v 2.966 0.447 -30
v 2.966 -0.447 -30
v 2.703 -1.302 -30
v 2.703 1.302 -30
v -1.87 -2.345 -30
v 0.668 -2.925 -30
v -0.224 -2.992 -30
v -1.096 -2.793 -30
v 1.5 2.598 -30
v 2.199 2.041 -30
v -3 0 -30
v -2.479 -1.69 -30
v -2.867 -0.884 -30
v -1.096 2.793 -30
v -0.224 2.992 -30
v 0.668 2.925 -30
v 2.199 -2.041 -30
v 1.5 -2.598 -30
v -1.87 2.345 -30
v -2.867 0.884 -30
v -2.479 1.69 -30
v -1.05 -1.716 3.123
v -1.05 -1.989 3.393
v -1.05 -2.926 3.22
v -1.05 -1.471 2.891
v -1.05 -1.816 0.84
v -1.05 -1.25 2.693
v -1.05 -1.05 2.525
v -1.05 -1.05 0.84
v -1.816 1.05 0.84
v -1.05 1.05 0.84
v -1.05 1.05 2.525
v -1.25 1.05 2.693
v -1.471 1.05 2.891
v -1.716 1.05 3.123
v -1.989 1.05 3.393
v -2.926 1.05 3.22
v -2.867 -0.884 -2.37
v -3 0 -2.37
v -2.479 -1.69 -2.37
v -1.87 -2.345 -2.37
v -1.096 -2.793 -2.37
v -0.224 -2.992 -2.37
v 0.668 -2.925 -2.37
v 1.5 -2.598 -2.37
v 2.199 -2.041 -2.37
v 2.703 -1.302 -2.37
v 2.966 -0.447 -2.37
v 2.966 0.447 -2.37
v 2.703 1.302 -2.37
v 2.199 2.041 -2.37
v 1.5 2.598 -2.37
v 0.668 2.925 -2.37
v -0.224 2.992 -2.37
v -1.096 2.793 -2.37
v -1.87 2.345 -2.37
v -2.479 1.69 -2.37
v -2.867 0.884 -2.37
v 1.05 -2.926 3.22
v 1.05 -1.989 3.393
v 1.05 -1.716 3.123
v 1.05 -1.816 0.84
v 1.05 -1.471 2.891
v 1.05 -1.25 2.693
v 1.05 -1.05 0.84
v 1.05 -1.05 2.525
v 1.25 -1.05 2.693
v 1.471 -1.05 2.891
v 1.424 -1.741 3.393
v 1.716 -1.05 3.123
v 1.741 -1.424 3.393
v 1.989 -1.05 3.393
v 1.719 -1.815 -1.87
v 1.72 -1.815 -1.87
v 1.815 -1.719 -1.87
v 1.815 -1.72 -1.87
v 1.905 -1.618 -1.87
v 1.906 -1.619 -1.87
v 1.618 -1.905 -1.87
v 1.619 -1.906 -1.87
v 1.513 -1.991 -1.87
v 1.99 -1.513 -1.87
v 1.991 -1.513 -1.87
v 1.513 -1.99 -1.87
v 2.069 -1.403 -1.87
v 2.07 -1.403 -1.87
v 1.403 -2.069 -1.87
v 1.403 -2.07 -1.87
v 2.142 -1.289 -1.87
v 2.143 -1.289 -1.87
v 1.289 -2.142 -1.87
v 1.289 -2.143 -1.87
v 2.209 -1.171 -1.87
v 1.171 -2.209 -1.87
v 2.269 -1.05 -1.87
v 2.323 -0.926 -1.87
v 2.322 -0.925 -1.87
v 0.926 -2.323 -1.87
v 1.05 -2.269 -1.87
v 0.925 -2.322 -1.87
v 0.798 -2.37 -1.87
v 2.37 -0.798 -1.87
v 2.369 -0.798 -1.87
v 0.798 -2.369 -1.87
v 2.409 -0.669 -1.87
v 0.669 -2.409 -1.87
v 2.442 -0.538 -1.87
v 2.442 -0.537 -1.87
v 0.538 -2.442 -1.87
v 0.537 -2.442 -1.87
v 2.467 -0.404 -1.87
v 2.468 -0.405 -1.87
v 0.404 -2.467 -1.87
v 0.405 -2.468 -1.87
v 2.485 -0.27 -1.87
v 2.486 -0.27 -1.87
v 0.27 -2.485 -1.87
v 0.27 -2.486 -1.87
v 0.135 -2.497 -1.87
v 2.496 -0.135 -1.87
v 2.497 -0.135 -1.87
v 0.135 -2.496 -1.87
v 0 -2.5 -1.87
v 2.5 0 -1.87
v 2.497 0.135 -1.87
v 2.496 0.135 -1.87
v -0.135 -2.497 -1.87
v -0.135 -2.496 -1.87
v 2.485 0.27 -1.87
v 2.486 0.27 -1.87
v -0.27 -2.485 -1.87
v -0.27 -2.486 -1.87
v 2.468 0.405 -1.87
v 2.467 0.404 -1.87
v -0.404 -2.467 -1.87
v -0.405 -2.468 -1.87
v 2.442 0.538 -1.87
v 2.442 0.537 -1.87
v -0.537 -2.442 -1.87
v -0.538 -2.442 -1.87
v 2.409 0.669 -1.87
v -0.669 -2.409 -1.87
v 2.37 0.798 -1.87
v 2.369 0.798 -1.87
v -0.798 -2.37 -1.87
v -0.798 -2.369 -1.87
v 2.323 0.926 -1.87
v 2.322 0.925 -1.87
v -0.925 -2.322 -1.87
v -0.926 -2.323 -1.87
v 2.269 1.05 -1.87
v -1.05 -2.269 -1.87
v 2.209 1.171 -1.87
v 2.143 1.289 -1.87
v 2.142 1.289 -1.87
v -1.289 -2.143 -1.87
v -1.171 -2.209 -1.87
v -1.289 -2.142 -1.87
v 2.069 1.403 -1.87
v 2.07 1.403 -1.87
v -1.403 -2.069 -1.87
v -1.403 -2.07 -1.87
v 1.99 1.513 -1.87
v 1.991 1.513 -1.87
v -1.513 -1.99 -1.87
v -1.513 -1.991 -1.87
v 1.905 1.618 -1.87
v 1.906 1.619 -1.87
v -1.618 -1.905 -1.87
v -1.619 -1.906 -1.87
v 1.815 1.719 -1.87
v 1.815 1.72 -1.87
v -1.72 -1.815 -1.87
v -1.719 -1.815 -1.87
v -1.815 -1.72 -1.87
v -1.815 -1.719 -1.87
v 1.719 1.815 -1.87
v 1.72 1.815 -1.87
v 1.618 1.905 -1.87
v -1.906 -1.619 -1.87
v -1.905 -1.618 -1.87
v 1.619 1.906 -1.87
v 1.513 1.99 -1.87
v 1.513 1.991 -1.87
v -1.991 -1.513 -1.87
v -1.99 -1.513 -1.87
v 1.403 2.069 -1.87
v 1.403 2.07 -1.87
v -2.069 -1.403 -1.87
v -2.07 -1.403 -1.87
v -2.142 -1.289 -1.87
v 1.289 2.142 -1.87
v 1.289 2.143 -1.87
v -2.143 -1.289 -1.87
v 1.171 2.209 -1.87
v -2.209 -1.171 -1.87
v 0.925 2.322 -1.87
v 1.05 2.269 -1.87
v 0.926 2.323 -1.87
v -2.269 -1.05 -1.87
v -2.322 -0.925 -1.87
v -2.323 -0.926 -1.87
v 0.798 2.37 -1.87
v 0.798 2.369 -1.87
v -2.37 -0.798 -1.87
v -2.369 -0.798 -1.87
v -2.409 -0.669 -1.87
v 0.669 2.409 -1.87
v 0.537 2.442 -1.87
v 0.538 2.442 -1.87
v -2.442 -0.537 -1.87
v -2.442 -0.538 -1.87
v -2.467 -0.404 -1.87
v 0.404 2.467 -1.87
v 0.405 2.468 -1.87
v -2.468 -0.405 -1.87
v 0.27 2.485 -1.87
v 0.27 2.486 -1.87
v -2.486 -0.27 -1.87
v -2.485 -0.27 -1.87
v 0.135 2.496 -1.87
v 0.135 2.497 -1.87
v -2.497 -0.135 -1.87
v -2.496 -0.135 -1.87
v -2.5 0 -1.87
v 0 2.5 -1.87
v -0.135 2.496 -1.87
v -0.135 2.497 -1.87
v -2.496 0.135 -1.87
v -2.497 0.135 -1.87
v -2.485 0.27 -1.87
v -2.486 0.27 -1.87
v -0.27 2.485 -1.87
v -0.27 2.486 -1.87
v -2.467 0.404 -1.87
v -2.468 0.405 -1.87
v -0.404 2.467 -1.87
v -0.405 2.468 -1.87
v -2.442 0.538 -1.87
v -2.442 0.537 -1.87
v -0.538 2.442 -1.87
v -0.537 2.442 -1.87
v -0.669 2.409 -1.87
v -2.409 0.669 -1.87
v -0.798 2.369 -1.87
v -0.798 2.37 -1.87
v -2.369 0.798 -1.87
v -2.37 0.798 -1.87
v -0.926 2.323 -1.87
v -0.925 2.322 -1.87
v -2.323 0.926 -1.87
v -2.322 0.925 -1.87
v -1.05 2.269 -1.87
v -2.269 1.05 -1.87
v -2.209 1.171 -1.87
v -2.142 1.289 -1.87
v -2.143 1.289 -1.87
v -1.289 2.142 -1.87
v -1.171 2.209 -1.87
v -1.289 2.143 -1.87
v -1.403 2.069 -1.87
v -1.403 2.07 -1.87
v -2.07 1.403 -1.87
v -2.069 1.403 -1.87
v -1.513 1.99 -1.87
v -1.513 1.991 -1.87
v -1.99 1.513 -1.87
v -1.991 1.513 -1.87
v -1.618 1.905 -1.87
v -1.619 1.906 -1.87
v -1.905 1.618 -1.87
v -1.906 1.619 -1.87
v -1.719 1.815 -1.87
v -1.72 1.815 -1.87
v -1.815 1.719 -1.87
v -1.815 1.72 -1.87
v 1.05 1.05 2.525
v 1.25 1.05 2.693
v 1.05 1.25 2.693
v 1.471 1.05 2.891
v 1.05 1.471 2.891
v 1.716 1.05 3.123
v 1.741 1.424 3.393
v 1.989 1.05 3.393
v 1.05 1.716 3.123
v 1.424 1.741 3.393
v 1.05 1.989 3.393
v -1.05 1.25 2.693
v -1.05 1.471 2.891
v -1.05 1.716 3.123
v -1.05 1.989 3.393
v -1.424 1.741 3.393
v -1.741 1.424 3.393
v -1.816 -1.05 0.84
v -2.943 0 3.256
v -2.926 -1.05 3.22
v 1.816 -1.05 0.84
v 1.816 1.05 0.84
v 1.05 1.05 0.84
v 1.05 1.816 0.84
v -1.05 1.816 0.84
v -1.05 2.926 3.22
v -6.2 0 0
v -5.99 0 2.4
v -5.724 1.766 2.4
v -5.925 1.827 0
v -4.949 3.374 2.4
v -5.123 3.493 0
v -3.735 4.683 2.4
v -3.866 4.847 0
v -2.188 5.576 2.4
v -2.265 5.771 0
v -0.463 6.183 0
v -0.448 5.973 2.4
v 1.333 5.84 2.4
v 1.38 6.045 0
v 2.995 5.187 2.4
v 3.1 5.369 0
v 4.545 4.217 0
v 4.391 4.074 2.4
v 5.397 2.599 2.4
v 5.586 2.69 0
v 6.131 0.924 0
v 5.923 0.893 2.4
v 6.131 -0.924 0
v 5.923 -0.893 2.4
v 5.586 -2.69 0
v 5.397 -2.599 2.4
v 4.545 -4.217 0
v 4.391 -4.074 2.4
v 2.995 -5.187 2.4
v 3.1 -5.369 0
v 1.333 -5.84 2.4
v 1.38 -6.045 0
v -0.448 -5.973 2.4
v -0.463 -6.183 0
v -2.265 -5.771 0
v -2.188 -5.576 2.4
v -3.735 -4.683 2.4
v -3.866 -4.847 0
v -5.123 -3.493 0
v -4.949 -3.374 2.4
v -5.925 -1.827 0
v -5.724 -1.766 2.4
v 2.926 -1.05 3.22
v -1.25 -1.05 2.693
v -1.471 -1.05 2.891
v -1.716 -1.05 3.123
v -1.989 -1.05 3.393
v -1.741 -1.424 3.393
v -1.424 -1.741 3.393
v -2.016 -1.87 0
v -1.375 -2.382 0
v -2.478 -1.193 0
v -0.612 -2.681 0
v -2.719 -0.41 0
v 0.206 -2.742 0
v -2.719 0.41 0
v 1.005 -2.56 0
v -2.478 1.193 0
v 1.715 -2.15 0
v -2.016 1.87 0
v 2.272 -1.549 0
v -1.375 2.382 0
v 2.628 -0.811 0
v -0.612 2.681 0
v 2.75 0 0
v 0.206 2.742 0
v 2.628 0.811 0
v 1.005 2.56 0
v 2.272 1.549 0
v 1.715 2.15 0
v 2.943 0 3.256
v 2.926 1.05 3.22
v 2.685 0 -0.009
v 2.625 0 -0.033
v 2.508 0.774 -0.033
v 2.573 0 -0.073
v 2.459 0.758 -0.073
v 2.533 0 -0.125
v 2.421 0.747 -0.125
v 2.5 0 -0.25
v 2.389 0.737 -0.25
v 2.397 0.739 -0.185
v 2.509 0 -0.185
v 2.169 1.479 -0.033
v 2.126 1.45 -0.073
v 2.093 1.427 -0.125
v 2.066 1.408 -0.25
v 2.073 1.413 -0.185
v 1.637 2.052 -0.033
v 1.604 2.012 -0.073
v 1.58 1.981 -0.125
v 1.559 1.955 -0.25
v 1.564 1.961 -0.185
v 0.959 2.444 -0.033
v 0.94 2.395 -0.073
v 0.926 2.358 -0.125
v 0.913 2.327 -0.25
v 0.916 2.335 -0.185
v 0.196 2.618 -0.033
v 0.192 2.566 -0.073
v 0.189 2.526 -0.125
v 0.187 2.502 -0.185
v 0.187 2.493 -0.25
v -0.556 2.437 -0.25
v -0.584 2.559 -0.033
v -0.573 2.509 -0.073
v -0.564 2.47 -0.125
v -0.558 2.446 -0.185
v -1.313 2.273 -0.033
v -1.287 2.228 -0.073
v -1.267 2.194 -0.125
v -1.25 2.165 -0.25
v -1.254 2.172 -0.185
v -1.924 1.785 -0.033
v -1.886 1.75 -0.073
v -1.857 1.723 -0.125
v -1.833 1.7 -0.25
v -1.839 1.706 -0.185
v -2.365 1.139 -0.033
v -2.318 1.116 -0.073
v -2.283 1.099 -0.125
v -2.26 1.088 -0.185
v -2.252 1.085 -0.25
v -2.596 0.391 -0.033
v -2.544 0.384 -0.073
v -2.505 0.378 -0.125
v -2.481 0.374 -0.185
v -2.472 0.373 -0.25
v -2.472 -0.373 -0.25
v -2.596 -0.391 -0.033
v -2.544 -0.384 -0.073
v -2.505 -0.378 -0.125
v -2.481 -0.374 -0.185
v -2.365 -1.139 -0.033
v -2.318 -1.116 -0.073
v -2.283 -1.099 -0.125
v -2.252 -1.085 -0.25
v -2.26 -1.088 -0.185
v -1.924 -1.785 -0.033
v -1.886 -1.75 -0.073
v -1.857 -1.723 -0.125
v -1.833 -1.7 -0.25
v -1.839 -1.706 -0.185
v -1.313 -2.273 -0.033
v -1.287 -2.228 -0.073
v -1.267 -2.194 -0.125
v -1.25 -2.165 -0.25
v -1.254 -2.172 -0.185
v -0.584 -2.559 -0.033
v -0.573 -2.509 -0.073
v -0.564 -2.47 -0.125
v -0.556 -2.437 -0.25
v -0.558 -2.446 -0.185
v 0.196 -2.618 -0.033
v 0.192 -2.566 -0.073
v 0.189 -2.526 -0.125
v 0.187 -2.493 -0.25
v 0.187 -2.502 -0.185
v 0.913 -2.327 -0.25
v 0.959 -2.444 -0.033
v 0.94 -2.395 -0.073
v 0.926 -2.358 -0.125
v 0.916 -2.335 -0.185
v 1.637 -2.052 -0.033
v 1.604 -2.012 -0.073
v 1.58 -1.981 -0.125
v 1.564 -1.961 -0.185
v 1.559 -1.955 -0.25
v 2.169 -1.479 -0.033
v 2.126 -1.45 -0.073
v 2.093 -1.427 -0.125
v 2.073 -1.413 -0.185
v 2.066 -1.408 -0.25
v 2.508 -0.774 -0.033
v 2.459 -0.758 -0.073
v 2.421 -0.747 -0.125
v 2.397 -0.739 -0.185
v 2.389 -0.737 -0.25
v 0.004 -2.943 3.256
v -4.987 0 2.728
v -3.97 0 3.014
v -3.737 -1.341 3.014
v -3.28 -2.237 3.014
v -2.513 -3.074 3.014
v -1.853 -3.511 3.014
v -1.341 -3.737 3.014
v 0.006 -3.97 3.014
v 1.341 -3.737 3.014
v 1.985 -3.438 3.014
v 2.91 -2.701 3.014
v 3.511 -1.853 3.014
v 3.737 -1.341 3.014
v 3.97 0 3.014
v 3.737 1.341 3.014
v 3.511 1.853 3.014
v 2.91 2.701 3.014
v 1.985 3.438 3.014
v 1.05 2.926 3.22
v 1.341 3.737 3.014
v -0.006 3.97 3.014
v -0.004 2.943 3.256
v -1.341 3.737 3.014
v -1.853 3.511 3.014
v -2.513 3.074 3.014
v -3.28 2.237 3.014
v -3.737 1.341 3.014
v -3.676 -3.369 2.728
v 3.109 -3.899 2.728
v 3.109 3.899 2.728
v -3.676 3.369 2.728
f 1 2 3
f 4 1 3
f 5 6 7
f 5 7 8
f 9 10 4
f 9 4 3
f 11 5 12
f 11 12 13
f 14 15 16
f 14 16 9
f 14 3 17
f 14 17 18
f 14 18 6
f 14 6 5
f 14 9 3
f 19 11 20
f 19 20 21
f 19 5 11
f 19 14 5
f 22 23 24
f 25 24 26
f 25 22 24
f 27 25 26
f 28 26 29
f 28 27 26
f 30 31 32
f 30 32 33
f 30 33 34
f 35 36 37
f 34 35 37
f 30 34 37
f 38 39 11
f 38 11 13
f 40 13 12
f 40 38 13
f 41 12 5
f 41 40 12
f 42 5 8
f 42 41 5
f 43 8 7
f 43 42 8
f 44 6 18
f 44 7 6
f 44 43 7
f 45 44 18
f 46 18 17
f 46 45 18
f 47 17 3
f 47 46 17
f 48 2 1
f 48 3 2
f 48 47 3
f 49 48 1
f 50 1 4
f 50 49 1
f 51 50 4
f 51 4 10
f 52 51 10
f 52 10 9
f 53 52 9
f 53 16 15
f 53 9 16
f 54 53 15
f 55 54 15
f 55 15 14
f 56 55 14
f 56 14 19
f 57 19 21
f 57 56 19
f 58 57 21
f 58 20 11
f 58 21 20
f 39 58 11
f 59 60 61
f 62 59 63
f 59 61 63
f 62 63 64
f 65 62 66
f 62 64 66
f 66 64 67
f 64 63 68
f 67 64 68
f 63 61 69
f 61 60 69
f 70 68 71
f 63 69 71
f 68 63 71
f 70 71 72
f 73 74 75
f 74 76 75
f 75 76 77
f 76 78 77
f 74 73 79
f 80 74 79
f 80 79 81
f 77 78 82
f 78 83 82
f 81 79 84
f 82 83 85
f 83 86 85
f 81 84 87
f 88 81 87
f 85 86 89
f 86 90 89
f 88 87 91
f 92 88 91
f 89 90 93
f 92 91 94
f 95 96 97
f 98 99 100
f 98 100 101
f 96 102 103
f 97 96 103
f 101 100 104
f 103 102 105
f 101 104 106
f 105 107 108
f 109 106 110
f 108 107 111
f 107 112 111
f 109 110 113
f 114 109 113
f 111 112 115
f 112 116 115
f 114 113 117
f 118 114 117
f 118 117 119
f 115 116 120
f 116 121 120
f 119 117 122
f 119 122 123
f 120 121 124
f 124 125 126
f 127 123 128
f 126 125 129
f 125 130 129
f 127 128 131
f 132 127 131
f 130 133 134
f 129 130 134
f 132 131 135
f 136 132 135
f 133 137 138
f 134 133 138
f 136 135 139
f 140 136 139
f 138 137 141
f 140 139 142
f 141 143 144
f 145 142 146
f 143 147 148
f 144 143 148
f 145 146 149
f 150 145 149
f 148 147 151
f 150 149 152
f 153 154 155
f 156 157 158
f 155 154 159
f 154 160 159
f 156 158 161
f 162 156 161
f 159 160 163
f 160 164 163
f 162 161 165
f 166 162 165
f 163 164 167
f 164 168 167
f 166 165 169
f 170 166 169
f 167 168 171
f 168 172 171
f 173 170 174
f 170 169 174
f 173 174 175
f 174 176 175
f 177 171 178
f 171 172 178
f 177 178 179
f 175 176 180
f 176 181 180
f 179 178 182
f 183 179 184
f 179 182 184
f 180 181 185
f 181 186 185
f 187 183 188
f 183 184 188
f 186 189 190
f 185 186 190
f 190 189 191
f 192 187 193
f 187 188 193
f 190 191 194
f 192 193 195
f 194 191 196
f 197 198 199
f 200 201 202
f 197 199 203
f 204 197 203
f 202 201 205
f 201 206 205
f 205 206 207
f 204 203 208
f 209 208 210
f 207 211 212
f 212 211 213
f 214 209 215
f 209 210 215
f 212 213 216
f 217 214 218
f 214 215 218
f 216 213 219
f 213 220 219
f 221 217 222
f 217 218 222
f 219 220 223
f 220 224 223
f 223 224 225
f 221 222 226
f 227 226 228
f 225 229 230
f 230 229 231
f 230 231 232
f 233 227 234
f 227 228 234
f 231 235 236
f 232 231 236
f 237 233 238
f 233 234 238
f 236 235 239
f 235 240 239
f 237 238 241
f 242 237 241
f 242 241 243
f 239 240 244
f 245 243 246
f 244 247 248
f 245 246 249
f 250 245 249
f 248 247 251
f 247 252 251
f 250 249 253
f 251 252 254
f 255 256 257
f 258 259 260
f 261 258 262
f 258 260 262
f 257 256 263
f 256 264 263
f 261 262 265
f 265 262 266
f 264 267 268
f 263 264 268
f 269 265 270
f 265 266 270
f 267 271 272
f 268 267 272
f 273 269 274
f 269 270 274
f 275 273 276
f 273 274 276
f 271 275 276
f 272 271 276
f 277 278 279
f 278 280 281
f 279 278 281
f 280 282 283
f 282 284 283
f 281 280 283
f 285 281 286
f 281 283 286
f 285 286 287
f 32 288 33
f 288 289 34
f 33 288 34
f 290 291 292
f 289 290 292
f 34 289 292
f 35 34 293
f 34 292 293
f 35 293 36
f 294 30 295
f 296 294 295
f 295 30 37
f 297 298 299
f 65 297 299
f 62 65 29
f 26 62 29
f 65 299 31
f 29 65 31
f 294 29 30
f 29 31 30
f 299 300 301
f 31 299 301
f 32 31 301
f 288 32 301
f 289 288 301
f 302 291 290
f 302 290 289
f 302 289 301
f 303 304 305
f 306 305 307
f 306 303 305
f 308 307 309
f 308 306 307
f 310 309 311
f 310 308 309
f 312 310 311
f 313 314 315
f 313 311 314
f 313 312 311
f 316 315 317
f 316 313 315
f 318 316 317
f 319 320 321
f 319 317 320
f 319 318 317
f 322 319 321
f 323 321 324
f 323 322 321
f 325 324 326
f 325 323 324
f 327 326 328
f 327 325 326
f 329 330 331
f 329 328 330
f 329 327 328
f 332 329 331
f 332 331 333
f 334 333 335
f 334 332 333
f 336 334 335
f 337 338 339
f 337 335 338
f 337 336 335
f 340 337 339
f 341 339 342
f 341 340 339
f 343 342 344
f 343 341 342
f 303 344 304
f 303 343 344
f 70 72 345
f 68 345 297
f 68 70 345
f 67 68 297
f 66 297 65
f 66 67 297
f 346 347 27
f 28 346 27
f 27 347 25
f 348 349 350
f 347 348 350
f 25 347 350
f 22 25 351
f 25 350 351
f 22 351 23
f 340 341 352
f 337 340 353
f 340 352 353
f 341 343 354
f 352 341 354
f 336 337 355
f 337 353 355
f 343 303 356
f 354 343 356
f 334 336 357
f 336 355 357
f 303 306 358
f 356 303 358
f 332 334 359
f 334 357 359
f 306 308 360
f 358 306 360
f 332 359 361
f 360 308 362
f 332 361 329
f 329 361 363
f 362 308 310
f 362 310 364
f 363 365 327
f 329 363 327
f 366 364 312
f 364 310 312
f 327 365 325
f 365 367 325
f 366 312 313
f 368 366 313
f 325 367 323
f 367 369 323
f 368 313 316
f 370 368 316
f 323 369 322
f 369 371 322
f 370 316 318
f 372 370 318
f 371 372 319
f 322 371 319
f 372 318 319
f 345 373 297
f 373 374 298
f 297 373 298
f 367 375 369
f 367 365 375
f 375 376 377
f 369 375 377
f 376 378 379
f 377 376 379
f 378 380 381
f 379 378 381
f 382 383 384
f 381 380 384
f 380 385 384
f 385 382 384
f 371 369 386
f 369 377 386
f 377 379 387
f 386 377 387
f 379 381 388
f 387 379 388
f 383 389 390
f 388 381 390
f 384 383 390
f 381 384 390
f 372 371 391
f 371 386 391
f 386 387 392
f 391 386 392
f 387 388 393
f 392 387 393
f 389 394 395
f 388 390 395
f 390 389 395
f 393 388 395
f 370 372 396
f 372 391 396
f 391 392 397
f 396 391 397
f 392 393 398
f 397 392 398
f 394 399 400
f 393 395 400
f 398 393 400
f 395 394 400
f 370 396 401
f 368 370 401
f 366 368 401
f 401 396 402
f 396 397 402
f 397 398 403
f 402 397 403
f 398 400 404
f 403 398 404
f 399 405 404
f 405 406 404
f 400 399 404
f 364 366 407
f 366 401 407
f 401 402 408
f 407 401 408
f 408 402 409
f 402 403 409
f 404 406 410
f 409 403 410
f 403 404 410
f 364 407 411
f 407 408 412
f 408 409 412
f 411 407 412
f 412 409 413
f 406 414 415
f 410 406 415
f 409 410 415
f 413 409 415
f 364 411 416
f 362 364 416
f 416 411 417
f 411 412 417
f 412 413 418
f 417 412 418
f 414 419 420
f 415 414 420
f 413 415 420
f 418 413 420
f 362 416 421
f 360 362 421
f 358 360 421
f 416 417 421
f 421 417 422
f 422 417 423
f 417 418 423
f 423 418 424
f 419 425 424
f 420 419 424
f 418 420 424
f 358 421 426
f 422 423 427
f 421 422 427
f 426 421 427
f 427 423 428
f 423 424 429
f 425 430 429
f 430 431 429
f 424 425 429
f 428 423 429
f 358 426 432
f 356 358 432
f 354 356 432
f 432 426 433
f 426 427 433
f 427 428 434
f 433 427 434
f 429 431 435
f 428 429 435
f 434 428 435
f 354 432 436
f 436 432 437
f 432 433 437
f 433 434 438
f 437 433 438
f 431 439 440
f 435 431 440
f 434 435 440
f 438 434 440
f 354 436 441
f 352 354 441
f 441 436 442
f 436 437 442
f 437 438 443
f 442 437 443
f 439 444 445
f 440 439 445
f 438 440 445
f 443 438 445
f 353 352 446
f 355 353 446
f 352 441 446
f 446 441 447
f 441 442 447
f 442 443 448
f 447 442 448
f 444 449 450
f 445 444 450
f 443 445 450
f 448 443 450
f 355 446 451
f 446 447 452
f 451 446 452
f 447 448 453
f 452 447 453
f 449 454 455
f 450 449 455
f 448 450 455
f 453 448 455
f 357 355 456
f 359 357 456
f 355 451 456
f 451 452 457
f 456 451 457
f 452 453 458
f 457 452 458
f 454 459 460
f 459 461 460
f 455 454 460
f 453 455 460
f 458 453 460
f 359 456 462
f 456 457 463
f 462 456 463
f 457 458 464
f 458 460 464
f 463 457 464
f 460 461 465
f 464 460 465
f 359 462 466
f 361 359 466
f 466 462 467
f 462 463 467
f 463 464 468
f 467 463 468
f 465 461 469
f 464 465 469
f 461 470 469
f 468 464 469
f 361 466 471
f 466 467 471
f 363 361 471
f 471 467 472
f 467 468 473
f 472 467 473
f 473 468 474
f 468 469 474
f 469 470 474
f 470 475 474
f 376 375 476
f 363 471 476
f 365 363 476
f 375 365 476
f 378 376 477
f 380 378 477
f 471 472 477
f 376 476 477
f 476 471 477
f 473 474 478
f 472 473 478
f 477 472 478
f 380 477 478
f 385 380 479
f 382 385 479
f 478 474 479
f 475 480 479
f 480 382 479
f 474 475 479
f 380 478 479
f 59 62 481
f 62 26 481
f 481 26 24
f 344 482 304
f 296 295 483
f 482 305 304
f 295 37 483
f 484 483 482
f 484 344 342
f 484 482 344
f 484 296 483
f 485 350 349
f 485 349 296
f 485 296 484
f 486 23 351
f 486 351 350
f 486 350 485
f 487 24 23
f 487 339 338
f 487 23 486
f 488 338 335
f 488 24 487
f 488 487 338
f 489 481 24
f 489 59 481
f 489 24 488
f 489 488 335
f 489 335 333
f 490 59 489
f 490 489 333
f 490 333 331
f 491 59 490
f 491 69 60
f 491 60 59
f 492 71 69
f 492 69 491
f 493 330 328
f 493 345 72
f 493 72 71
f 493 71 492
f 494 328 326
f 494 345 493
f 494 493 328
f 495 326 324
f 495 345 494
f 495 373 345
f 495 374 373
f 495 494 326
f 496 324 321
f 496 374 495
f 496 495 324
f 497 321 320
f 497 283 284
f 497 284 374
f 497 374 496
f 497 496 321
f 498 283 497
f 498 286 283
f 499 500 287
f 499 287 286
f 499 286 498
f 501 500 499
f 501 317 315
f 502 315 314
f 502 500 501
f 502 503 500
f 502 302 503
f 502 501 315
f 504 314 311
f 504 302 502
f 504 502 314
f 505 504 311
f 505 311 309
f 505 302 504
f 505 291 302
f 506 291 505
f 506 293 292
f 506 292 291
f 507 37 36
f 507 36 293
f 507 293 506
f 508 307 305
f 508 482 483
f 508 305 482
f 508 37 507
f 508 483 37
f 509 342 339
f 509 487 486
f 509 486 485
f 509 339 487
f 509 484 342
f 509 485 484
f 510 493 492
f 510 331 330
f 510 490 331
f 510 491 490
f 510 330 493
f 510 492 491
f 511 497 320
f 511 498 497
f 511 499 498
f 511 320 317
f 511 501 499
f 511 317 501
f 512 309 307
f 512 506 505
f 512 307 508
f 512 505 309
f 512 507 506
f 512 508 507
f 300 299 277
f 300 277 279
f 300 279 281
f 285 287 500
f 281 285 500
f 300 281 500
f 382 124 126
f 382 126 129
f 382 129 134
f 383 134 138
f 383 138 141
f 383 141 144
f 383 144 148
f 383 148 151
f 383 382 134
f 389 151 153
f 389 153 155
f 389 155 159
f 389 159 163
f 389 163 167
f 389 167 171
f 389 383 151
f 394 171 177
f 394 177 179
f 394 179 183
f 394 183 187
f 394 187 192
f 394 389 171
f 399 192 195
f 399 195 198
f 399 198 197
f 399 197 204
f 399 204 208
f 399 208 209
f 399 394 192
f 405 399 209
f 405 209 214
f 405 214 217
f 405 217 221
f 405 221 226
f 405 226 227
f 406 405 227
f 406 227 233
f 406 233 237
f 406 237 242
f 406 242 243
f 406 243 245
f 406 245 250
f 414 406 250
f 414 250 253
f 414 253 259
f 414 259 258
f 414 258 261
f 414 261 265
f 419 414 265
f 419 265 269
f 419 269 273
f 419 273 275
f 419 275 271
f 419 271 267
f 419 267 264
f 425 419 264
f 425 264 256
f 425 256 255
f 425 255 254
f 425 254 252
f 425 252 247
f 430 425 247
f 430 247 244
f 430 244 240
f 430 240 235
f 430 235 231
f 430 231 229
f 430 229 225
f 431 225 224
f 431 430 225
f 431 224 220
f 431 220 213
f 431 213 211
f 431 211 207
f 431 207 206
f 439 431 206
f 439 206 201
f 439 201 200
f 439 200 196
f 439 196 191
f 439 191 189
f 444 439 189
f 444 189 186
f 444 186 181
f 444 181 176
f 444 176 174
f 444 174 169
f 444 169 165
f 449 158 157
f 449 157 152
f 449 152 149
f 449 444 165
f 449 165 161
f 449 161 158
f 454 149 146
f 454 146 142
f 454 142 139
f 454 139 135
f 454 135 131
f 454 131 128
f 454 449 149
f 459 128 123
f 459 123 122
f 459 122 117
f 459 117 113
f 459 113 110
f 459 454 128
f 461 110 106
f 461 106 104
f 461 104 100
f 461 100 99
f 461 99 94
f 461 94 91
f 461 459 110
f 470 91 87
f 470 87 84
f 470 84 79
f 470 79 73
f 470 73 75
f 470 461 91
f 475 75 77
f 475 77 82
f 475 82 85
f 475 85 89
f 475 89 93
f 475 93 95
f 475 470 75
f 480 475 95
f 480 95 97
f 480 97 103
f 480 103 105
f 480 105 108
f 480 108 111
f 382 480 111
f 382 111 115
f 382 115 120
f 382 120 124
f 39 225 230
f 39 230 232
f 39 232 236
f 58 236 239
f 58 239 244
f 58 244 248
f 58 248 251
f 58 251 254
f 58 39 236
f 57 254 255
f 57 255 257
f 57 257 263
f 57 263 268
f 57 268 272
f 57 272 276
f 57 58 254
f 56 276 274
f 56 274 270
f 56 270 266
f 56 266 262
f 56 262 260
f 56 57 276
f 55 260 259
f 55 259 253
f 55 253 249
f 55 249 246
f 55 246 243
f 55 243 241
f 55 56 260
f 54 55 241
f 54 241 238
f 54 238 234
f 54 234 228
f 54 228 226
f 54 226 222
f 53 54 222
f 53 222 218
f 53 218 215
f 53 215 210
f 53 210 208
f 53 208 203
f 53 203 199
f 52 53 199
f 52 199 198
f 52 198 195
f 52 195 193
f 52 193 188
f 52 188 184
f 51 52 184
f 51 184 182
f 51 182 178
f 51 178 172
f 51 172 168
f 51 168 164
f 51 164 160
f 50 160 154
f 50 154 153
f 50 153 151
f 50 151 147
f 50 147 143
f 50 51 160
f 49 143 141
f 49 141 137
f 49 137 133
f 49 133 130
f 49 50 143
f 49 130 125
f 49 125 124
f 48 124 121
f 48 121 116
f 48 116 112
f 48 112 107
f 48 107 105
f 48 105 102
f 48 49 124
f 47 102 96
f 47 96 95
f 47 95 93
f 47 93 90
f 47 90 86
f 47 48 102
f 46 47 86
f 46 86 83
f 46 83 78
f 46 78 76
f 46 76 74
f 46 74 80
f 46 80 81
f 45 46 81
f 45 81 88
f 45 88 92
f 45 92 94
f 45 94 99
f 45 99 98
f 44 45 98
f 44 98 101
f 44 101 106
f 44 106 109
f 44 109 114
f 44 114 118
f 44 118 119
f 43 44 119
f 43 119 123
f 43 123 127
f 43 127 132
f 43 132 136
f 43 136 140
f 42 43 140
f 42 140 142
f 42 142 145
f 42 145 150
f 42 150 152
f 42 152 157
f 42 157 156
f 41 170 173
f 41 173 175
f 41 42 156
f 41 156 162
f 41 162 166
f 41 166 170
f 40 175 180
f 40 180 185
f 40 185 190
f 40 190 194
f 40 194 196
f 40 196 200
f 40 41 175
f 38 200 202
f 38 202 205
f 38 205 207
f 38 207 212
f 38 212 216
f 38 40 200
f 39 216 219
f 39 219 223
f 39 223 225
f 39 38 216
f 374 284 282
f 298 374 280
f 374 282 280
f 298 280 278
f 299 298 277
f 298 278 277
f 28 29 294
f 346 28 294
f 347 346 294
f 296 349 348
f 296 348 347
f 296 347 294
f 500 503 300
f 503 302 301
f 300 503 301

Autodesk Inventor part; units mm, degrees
ref_plane "YZ Plane" through (0, 0, 0) normal (1, 0, 0) x (0, 1, 0)
sketch "Эскиз2" plane through (0, 0, 0) normal (0, 0, 1) x (1, 0, 0)
  circle A0 centre (0, 0) radius 2.5
  dimension "d3" = 5
extrude "Выдавливание1" add sketch "Эскиз2" against normal blind 1.87
sketch "Эскиз3" plane through (0, 0, -1.87) normal (0, 0, -1) x (-1, 0, 0)
  circle A0 centre (0, 0) radius 3
  circle A1 centre (0, 0) radius 2.5 construction
  dimension "d28" = 360
  dimension "d9" = 6
extrude "Выдавливание2" add sketch "Эскиз3" along normal blind 28.13
chamfer "Фаска1" distance 0.5 distance2 0.5 1 edges at (3, 0, -1.87) measured on face at (-2.7801, -0.4387, -1.87)
sketch "Эскиз4" plane through (0, 0, 0) normal (0, 0, 1) x (1, 0, 0)
  circle A0 centre (0, 0) radius 6.2
  circle A1 centre (0, 0) radius 2.5 construction
  dimension "d15" = 12.4
extrude "Выдавливание3" add sketch "Эскиз4" along normal blind 2.4
fillet "Сопряжение1" radius 0.25 1 edges at (-2.5, 0, 0)
sketch "Эскиз5" plane through (0, 0, 0) normal (0, 1, 0) x (-1, 0, 0)
  line L0 (6.2, 2.4) -> (6.2, 0)
  line L1 (5.99, 2.4) -> (6.2, 2.4)
  line L2 (6.2, 0) -> (5.99, 2.4)
  line L3 (-6.2, 2.4) -> (6.2, 2.4) construction
  line L4 (-6.2, 0) -> (6.2, 0) construction
  line L5 (0, -0.48) -> (0, 2.88) projected
  line L6 (8.68, 0) -> (-8.68, 0) projected
  dimension "d20" = 5
  dimension "d56" = 6.2
  dimension "d57" = 2.4
revolve "Вращение1" cut sketch "Эскиз5" angle 360 about axis through (0, 0, -10) along (0, 0, 1)
sketch "Эскиз6" plane through (0, 0, 0) normal (0, 1, 0) x (-1, 0, 0)
  line L0 (0, 3.7) -> (0, 2.4)
  arc A0 (5.99, 2.4) -> (0, 3.7) centre (-2.2245, -21) ccw
  line L1 (0, 2.4) -> (5.99, 2.4)
  line L2 (5.99, 2.4) -> (-5.99, 2.4) construction
  line L3 (0, -4.4495) -> (0, 0.4495)
  line L4 (0, -25.9772) -> (0, 8.8629) projected
  line L5 (8.4344, 0) -> (-8.3941, 0) projected
  dimension "d58" = 1.3
  dimension "d59" = 5.99
  dimension "d60" = 0
  dimension "d62" = 24.8
revolve "Вращение2" add sketch "Эскиз6" angle 360 about axis through (0, 0, -4.4495) along (0, 0, 1)
sketch "Эскиз7" plane through (0, 0, 0) normal (0, 1, 0) x (-1, 0, 0)
  line L0 (3.15, 3.7) -> (-3.15, 3.7)
  line L1 (1.8164, 0.84) -> (3.15, 3.7)
  line L2 (-1.8164, 0.84) -> (1.8164, 0.84)
  line L3 (-3.15, 3.7) -> (-1.8164, 0.84)
  line L4 (0, 0.268) -> (0, 4.272) projected
  line L5 (4.41, 0) -> (-4.41, 0) projected
  dimension "d32" = 2.86
  dimension "d34" = 65
  dimension "d36" = 65
  dimension "d63" = 3.15
  dimension "d64" = 3.7
  dimension "d65" = 6.3
extrude "Выдавливание4" cut sketch "Эскиз7" against normal mid plane 2.1
sketch "Эскиз8" plane through (0, 0, 0) normal (1, 0, 0) x (0, 1, 0)
  line L0 (-1.8164, 0.84) -> (-3.15, 3.7)
  line L1 (1.8164, 0.84) -> (-1.8164, 0.84)
  line L2 (3.15, 3.7) -> (1.8164, 0.84)
  line L3 (-3.15, 3.7) -> (3.15, 3.7)
  line L4 (0, 0.268) -> (0, 4.272) projected
  line L5 (-4.41, 0) -> (4.41, 0) projected
  dimension "d40" = 65
  dimension "d42" = 65
  dimension "d44" = 2.86
  dimension "d66" = 6.3
  dimension "d67" = 3.7
  dimension "d69" = 3.15
extrude "Выдавливание5" cut sketch "Эскиз8" along normal mid plane 2.1
sketch "Эскиз9" plane through (0, 0, 0) normal (0, 1, 0) x (-1, 0, 0)
  line L0 (0, 3.7) -> (0, 0.84)
  line L1 (2.52, 3.7) -> (0, 3.7)
  line L2 (0, 0.84) -> (2.52, 3.7)
  line L3 (-6.2, 0) -> (6.2, 0) construction
  line L4 (0, -0.74) -> (0, 4.44) projected
  line L5 (8.68, 0) -> (-8.68, 0) projected
  dimension "d50" = 2.86
  dimension "d52" = 2.86
  dimension "d54" = 2.52
  dimension "d70" = 0
  dimension "d71" = 3.7
revolve "Вращение3" cut sketch "Эскиз9" angle 360 about axis through (0, 0, -10) along (0, 0, 1)
thread "Резьба1" size "M6x1" class "6g" standard "ISO Metric profile" full length
ref_plane "MSC_PF1" through (0, 0, 0) normal (1, 0, 0) x (0, 1, 0)
ref_plane "MSC_PT1" through (0, 0, 0) normal (0, 0, -1) x (-1, 0, 0)
equation "\"d4\" = -b + NLG"
equation "\"d9\" = NND"
equation "\"d10\" = b"
equation "\"d12\" = -0.5 * msp_ds + 0.5 * NND"
equation "\"d13\" = 0.5 * NND - 0.5 * msp_ds"
equation "\"d15\" = Dk"
equation "\"d16\" = ParK"
equation "\"d18\" = r"
equation "\"d32\" = q"
equation "\"d63\" = 0.5 * M"
equation "\"d64\" = ParK + ParF"
equation "\"d65\" = M"
equation "\"d37\" = 2 * msp_s"
equation "\"d44\" = q"
equation "\"d66\" = M"
equation "\"d67\" = ParK + ParF"
equation "\"d69\" = 0.5 * M"
equation "\"d47\" = 2 * msp_s"
equation "\"d3\" = msp_ds"
equation "\"d56\" = 0.5 * Dk"
equation "\"d57\" = ParK"
equation "\"d58\" = ParF"
equation "\"d59\" = 0.5 * Dk - msp_v"
equation "\"d62\" = 2 * Dk"
equation "\"d50\" = q"
equation "\"d52\" = q"
equation "\"d54\" = msp_rr"
equation "\"d71\" = ParK + ParF"
equation "\"PTC\" = 1"
equation "\"NLG\" = 30"
equation "\"Dk\" = 12.4"
equation "\"ParK\" = 2.4"
equation "\"NND\" = 6"
equation "\"M\" = 6.3"
equation "\"q\" = 2.86"
equation "\"r\" = 0.25"
equation "\"msp_ds\" = NND - PTC"
equation "\"b\" = 28.13"
equation "\"msp_x\" = 1.25 * PTC"
equation "\"msp_s\" = 0.166667 * M"
equation "\"msp_rr\" = 0.4 * M"
equation "\"ParF\" = 1.3"
equation "\"msp_v\" = 0.0874887 * ParK"
equation "\"THREADDIA\" = NND"
properties part number "JIS B 1111 - M6x30" material "Сталь, мягкая"
